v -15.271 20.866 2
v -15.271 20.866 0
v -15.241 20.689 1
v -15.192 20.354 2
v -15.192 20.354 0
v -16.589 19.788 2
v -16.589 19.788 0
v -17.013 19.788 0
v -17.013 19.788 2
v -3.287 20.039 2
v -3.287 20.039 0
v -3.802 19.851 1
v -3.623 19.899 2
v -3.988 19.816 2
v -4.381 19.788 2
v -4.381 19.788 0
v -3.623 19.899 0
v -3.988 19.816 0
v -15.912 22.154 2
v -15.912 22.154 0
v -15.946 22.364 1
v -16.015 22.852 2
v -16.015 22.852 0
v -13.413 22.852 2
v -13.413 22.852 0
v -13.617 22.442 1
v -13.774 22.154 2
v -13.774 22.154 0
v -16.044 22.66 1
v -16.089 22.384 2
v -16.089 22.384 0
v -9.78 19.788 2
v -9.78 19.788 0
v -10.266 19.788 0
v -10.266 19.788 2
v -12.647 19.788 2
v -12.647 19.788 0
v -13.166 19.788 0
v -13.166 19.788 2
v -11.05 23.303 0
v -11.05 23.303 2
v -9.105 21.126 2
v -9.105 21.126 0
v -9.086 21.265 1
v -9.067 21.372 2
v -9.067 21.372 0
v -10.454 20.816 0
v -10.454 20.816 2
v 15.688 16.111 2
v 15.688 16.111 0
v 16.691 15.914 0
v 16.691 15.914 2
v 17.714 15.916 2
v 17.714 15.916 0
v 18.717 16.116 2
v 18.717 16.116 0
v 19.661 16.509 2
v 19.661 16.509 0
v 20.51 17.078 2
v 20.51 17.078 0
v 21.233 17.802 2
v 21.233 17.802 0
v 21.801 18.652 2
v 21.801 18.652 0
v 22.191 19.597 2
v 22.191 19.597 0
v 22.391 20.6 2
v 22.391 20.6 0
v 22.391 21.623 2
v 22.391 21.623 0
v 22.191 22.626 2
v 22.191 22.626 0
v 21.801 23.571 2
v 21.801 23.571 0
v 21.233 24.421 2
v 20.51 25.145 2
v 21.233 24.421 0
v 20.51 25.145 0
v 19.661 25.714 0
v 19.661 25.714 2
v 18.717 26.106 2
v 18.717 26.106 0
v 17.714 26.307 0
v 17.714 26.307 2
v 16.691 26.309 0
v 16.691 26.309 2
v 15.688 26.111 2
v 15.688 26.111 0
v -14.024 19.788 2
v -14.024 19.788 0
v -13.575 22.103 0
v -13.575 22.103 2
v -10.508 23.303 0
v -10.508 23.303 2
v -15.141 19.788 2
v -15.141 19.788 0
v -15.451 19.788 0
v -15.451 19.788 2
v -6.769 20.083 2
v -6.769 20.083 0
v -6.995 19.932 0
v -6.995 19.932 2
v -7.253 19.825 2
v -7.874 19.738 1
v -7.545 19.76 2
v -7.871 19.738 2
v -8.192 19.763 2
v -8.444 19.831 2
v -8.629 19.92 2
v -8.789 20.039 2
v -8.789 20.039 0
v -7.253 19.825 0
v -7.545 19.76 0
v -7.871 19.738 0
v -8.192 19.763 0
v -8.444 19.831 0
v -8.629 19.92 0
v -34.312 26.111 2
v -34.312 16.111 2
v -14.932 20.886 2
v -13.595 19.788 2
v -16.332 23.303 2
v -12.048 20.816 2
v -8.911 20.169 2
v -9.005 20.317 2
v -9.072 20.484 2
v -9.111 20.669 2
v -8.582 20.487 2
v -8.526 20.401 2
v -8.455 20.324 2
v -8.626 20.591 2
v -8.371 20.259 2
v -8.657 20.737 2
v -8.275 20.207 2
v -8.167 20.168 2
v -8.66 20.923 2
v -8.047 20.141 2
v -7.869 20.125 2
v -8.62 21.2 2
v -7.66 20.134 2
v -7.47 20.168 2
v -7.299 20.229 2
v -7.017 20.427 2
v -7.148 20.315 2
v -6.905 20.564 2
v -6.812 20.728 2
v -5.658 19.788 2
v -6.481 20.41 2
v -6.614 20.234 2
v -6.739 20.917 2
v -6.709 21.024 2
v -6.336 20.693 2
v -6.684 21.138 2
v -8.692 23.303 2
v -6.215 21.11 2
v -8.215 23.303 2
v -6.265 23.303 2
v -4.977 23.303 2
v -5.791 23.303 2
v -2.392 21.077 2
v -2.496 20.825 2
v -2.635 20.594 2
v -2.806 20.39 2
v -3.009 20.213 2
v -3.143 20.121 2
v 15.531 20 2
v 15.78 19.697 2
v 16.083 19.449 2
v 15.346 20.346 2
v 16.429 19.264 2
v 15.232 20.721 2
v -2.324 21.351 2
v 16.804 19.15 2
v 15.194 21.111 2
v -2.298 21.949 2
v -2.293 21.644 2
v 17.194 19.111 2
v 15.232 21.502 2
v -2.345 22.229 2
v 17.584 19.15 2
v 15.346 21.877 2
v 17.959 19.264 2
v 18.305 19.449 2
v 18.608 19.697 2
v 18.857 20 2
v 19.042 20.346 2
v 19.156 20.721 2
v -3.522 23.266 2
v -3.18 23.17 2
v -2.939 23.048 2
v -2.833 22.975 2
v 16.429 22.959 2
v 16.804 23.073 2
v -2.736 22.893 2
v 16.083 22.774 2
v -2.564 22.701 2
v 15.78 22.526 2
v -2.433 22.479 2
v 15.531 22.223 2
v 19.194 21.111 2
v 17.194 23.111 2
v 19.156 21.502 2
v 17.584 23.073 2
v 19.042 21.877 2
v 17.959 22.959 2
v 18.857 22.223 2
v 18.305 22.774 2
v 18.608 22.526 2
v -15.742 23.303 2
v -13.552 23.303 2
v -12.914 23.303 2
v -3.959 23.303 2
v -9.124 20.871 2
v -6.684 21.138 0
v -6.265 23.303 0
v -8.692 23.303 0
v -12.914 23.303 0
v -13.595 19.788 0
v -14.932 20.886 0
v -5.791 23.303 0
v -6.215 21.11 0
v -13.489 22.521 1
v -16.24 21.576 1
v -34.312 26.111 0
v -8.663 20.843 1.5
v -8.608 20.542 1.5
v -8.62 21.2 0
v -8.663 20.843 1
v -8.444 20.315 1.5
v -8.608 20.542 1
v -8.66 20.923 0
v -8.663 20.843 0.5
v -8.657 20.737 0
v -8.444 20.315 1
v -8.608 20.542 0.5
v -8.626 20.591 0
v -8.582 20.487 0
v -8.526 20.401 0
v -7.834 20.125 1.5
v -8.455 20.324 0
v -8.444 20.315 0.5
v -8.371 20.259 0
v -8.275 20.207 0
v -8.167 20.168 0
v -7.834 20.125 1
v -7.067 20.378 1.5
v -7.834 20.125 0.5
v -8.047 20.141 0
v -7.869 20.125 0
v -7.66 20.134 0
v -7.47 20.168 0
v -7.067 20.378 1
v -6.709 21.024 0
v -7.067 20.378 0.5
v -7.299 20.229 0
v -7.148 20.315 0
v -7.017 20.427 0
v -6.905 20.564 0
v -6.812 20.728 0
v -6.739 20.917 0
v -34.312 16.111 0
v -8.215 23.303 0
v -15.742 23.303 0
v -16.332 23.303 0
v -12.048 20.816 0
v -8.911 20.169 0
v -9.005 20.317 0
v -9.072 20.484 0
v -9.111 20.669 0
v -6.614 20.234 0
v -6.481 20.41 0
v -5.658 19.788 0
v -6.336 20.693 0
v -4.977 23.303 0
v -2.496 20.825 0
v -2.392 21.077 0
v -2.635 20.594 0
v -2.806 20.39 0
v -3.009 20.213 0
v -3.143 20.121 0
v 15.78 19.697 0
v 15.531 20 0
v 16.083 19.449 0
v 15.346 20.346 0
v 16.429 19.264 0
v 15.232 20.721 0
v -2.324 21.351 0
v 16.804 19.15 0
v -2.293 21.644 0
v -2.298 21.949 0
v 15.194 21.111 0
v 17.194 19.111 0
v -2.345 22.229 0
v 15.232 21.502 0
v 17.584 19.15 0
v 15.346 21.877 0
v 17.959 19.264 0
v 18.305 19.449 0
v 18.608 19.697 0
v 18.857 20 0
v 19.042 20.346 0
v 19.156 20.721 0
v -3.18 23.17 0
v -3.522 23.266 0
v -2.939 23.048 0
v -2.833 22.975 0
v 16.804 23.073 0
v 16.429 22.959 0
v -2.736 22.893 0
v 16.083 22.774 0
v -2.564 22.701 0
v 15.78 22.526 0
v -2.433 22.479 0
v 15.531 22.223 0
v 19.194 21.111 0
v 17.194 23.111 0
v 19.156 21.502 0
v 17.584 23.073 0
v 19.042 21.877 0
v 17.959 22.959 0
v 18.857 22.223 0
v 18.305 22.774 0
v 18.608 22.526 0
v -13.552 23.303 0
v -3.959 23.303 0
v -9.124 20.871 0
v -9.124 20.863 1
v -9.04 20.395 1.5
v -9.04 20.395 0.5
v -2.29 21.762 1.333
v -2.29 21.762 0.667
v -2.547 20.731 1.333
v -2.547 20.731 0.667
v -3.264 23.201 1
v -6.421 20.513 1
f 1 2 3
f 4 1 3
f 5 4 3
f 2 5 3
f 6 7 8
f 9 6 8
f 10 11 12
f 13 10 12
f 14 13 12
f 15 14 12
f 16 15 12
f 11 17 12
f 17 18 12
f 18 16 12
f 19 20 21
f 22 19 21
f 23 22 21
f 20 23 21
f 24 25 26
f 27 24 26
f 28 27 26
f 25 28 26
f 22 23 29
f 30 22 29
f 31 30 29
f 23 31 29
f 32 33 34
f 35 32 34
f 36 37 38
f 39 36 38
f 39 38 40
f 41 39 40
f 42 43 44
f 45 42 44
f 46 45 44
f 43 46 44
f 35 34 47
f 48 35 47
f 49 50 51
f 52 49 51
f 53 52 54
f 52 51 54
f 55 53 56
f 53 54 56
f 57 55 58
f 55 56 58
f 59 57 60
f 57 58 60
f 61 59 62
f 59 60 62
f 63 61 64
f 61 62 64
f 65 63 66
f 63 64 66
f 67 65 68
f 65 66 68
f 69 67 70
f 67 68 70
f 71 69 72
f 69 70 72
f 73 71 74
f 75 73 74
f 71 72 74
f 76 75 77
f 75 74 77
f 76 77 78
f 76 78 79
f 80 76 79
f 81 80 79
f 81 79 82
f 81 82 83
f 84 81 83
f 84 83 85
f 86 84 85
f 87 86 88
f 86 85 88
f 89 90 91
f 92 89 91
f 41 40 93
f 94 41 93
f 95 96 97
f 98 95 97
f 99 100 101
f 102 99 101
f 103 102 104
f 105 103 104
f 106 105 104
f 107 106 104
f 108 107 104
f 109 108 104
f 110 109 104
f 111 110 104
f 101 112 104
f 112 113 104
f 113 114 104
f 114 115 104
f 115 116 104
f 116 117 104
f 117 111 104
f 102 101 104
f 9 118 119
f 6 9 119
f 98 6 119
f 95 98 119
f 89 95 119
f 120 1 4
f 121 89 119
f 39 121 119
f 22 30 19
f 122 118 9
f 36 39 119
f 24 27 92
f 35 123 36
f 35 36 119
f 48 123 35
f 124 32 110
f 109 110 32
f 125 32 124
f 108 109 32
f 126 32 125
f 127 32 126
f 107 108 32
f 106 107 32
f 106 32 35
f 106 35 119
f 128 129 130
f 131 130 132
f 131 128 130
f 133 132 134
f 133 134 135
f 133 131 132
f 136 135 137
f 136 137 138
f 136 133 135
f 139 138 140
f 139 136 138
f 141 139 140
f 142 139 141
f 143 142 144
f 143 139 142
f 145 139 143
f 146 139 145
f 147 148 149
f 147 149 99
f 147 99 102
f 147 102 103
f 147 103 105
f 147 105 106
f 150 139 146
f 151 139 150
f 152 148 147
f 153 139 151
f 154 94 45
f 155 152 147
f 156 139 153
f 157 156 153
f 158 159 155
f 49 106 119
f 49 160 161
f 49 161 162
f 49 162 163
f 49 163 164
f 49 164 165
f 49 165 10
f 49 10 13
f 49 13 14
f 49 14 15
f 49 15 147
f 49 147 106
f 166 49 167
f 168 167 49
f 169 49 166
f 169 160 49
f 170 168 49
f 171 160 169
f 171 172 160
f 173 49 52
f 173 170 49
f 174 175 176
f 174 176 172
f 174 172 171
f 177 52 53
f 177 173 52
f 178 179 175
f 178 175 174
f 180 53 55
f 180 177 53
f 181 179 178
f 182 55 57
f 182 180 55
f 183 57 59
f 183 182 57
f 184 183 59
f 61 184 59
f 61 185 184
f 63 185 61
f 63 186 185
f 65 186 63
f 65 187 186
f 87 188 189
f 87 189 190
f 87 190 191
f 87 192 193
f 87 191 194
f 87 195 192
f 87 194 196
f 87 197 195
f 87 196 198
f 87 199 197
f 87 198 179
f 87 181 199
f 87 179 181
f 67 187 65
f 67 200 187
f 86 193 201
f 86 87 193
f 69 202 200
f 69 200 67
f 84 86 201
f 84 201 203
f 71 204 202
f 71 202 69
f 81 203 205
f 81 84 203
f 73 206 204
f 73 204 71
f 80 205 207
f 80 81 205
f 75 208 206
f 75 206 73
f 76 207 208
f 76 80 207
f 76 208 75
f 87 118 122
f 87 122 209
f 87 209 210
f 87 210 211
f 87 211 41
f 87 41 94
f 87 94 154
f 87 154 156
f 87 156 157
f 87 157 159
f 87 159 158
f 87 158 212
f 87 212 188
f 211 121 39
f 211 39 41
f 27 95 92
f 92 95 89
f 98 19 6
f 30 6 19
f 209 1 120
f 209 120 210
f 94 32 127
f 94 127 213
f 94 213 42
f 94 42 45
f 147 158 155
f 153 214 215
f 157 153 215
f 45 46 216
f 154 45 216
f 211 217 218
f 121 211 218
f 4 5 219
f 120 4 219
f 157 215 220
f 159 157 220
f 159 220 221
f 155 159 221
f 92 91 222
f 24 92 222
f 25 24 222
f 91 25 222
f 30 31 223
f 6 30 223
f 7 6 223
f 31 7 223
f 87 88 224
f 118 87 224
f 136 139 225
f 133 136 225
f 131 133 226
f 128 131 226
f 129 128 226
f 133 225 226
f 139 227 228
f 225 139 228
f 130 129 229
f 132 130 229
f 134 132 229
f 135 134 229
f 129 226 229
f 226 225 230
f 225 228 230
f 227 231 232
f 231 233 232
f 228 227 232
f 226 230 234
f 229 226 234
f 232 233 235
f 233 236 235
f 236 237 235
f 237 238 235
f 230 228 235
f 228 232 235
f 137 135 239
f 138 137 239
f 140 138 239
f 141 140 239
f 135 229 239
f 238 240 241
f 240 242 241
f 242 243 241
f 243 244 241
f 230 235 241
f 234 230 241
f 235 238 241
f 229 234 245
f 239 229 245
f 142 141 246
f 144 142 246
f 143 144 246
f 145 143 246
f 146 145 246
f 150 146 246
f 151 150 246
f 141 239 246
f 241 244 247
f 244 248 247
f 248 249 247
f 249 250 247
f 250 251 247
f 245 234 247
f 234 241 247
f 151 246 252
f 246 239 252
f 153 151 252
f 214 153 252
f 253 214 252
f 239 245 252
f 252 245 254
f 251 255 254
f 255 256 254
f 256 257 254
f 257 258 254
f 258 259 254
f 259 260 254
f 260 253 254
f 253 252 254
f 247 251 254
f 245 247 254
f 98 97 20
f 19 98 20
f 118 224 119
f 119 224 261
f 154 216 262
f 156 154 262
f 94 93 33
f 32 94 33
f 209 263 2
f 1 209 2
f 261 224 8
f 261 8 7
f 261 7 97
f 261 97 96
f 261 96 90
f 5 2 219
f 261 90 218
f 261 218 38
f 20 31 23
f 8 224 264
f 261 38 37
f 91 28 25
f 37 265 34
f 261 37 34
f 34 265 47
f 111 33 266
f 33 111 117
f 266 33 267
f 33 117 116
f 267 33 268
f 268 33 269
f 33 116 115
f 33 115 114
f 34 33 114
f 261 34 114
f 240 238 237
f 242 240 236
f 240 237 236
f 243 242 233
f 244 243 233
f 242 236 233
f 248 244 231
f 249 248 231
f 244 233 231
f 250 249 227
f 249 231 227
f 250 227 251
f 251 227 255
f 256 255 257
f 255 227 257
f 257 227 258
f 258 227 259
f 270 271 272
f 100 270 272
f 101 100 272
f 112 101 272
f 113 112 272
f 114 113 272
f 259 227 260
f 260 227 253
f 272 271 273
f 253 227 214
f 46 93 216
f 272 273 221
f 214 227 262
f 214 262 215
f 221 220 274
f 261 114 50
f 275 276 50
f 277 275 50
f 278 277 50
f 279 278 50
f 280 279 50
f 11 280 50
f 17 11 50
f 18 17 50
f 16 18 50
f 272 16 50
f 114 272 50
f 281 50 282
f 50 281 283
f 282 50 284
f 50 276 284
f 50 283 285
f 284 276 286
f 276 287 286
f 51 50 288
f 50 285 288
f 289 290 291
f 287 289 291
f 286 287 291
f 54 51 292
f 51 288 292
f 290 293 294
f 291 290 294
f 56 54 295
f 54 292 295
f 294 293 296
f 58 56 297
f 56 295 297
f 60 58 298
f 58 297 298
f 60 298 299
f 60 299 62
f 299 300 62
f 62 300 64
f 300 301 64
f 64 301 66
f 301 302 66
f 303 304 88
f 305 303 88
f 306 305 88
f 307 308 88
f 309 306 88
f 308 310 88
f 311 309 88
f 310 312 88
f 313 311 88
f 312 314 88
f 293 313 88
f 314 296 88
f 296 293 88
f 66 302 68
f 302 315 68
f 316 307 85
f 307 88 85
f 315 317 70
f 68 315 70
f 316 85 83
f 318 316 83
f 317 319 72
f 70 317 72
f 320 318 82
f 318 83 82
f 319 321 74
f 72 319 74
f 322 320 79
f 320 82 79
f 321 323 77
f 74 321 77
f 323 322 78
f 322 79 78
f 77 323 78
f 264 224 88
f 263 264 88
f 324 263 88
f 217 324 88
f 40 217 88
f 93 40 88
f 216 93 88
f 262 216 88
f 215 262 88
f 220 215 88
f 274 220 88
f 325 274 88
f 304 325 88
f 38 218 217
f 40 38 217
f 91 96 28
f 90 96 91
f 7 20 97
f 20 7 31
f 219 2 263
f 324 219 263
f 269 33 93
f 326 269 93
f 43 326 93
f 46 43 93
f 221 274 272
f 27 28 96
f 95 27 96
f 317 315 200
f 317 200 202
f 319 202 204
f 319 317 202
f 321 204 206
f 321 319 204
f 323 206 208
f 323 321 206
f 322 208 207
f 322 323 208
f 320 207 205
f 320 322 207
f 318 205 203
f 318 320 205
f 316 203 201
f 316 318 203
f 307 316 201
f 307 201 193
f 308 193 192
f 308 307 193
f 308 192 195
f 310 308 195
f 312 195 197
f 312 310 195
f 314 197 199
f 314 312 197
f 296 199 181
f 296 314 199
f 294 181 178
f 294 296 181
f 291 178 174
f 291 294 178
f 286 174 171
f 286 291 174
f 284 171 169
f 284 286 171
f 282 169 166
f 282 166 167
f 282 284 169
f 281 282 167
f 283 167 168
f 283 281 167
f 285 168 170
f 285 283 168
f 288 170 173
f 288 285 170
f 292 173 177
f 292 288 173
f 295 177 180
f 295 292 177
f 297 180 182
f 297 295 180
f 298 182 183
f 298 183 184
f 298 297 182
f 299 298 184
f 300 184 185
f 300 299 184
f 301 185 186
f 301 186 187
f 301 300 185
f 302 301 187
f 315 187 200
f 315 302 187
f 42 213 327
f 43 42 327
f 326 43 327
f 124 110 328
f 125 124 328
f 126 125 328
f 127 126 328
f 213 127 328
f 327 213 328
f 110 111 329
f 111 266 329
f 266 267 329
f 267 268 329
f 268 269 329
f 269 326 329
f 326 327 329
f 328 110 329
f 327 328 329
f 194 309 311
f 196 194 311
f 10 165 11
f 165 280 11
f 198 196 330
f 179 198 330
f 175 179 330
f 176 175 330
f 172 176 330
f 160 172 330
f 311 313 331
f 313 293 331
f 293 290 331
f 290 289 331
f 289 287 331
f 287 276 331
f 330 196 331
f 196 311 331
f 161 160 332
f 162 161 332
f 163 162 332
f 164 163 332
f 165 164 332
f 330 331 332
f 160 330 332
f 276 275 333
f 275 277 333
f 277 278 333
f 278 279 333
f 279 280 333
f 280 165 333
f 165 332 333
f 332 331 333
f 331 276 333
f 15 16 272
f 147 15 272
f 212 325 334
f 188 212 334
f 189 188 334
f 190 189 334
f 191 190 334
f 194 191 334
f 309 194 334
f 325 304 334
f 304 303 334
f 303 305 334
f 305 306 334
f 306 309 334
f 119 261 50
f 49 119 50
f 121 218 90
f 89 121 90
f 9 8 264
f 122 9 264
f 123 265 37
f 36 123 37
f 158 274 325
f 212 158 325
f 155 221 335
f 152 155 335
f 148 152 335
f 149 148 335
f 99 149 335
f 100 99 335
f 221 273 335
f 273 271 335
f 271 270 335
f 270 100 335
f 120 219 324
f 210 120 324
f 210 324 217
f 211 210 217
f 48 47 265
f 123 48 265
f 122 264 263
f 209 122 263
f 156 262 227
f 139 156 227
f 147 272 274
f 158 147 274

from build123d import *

# Parameters (mm, degrees)
F0_R     = 2
F1_DEPTH = 2


with BuildPart() as f1:
    # F0 (on Top) → F1 (new body)
    with BuildSketch(Plane.XY):
        with BuildLine():
            Line((15.6879561022, 26.1114555106), (-34.3120438978, 26.1114555106))
            Line((-34.3120438978, 26.1114555106), (-34.3120438978, 16.1114555106))
            Line((-34.3120438978, 16.1114555106), (15.6879561022, 16.1114555106))
            ThreePointArc((15.6879561022, 16.1114555106), (22.4158513012, 21.1114555106), (15.6879561022, 26.1114555106))
        make_face()
        with Locations((17.1939675076, 21.1114555106)):
            Circle(F0_R, mode=Mode.SUBTRACT)
        with BuildLine():
            Line((-13.594810762, 19.7880361229), (-14.0235288377, 19.7880361229))
            Line((-14.0235288377, 19.7880361229), (-13.5748518199, 22.1032734035))
            add(Edge.make_bspline(
                [(-13.5748518199, 22.1032734035), (-13.4846374017, 22.5647241443), (-13.4127852103, 22.8521329102)],
                knots=[0, 0, 0, 1, 1, 1], degree=2))
            add(Edge.make_bspline(
                [(-13.4127852103, 22.8521329102), (-13.6395187922, 22.3803035195), (-13.7744412407, 22.1535699376)],
                knots=[0, 0, 0, 1, 1, 1], degree=2))
            Line((-13.7744412407, 22.1535699376), (-15.1412295939, 19.7880361229))
            Line((-15.1412295939, 19.7880361229), (-15.4509923749, 19.7880361229))
            Line((-15.4509923749, 19.7880361229), (-15.9124431157, 22.1535699376))
            add(Edge.make_bspline(
                [(-15.9124431157, 22.1535699376), (-15.9276119116, 22.225422129), (-16.0146328991, 22.8521329102)],
                knots=[0, 0, 0, 1, 1, 1], degree=2))
            add(Edge.make_bspline(
                [(-16.0146328991, 22.8521329102), (-16.0369869142, 22.7020416658), (-16.0892793424, 22.3838961291)],
                knots=[0, 0, 0, 1, 1, 1], degree=2))
            add(Edge.make_bspline(
                [(-16.0892793424, 22.3838961291), (-16.1415717707, 22.0657505924), (-16.5886520731, 19.7880361229)],
                knots=[0, 0, 0, 1, 1, 1], degree=2))
            Line((-16.5886520731, 19.7880361229), (-17.0125800028, 19.7880361229))
            Line((-17.0125800028, 19.7880361229), (-16.3315808992, 23.3032050011))
            Line((-16.3315808992, 23.3032050011), (-15.7423929292, 23.3032050011))
            Line((-15.7423929292, 23.3032050011), (-15.2713618962, 20.8658189949))
            add(Edge.make_bspline(
                [(-15.2713618962, 20.8658189949), (-15.2514029542, 20.7684193576), (-15.1915261279, 20.3540717201)],
                knots=[0, 0, 0, 1, 1, 1], degree=2))
            Line((-15.1915261279, 20.3540717201), (-14.932059881, 20.885777937))
            Line((-14.932059881, 20.885777937), (-13.5524978048, 23.3032050011))
            Line((-13.5524978048, 23.3032050011), (-12.9138116584, 23.3032050011))
            Line((-12.9138116584, 23.3032050011), (-13.594810762, 19.7880361229))
        make_face(mode=Mode.SUBTRACT)
        Polygon((-9.7802577527, 19.7880361229), (-10.2664575817, 19.7880361229), (-10.4540716372, 20.8163208186), (-12.0483919301, 20.8163208186), (-12.6471601923, 19.7880361229), (-13.1660926862, 19.7880361229), (-11.0504448263, 23.3032050011), (-10.5083599596, 23.3032050011), align=None, mode=Mode.SUBTRACT)
        with BuildLine():
            add(Edge.make_bspline(
                [(-6.7688525726, 20.0834284656), (-7.1879903561, 19.7377395889), (-7.8737796058, 19.7377395889)],
                knots=[0, 0, 0, 1, 1, 1], degree=2))
            add(Edge.make_bspline(
                [(-7.8737796058, 19.7377395889), (-8.454983999, 19.7377395889), (-8.7894958682, 20.0387204354)],
                knots=[0, 0, 0, 1, 1, 1], degree=2))
            add(Edge.make_bspline(
                [(-8.7894958682, 20.0387204354), (-9.1240077373, 20.3397012819), (-9.1240077373, 20.8634239219)],
                knots=[0, 0, 0, 1, 1, 1], degree=2))
            add(Edge.make_bspline(
                [(-9.1240077373, 20.8634239219), (-9.1240077373, 20.9727989245), (-9.1052463318, 21.1264827784)],
                knots=[0, 0, 0, 1, 1, 1], degree=2))
            add(Edge.make_bspline(
                [(-9.1052463318, 21.1264827784), (-9.0864849262, 21.2801666324), (-9.0665259842, 21.3719777659)],
                knots=[0, 0, 0, 1, 1, 1], degree=2))
            Line((-9.0665259842, 21.3719777659), (-8.6920962308, 23.3032050011))
            Line((-8.6920962308, 23.3032050011), (-8.2154766941, 23.3032050011))
            Line((-8.2154766941, 23.3032050011), (-8.6202440394, 21.2003308641))
            add(Edge.make_bspline(
                [(-8.6202440394, 21.2003308641), (-8.6625569966, 20.9831775743), (-8.6625569966, 20.8434649798)],
                knots=[0, 0, 0, 1, 1, 1], degree=2))
            add(Edge.make_bspline(
                [(-8.6625569966, 20.8434649798), (-8.6625569966, 20.5041629645), (-8.4442061703, 20.3145530148)],
                knots=[0, 0, 0, 1, 1, 1], degree=2))
            add(Edge.make_bspline(
                [(-8.4442061703, 20.3145530148), (-8.225855344, 20.1249430651), (-7.8338617216, 20.1249430651)],
                knots=[0, 0, 0, 1, 1, 1], degree=2))
            add(Edge.make_bspline(
                [(-7.8338617216, 20.1249430651), (-6.8758325021, 20.1249430651), (-6.6842266582, 21.1380589648)],
                knots=[0, 0, 0, 1, 1, 1], degree=2))
            Line((-6.6842266582, 21.1380589648), (-6.2650888746, 23.3032050011))
            Line((-6.2650888746, 23.3032050011), (-5.7908644109, 23.3032050011))
            Line((-5.7908644109, 23.3032050011), (-6.2147923406, 21.1101164459))
            add(Edge.make_bspline(
                [(-6.2147923406, 21.1101164459), (-6.349714789, 20.4291173423), (-6.7688525726, 20.0834284656)],
                knots=[0, 0, 0, 1, 1, 1], degree=2))
        make_face(mode=Mode.SUBTRACT)
        with BuildLine():
            Line((-4.977337932, 23.3032050011), (-3.9594318862, 23.3032050011))
            add(Edge.make_bspline(
                [(-3.9594318862, 23.3032050011), (-3.1810331453, 23.3032050011), (-2.7355495582, 22.892849152)],
                knots=[0, 0, 0, 1, 1, 1], degree=2))
            add(Edge.make_bspline(
                [(-2.7355495582, 22.892849152), (-2.2900659711, 22.482493303), (-2.2900659711, 21.7615763152)],
                knots=[0, 0, 0, 1, 1, 1], degree=2))
            add(Edge.make_bspline(
                [(-2.2900659711, 21.7615763152), (-2.2900659711, 21.1723883452), (-2.547137145, 20.7308965465)],
                knots=[0, 0, 0, 1, 1, 1], degree=2))
            add(Edge.make_bspline(
                [(-2.547137145, 20.7308965465), (-2.8042083189, 20.2894047478), (-3.2868155383, 20.0387204354)],
                knots=[0, 0, 0, 1, 1, 1], degree=2))
            add(Edge.make_bspline(
                [(-3.2868155383, 20.0387204354), (-3.7694227576, 19.7880361229), (-4.3809647428, 19.7880361229)],
                knots=[0, 0, 0, 1, 1, 1], degree=2))
            Line((-4.3809647428, 19.7880361229), (-5.6583370355, 19.7880361229))
            Line((-5.6583370355, 19.7880361229), (-4.977337932, 23.3032050011))
        make_face(mode=Mode.SUBTRACT)
    extrude(amount=F1_DEPTH)


solid = f1.part
